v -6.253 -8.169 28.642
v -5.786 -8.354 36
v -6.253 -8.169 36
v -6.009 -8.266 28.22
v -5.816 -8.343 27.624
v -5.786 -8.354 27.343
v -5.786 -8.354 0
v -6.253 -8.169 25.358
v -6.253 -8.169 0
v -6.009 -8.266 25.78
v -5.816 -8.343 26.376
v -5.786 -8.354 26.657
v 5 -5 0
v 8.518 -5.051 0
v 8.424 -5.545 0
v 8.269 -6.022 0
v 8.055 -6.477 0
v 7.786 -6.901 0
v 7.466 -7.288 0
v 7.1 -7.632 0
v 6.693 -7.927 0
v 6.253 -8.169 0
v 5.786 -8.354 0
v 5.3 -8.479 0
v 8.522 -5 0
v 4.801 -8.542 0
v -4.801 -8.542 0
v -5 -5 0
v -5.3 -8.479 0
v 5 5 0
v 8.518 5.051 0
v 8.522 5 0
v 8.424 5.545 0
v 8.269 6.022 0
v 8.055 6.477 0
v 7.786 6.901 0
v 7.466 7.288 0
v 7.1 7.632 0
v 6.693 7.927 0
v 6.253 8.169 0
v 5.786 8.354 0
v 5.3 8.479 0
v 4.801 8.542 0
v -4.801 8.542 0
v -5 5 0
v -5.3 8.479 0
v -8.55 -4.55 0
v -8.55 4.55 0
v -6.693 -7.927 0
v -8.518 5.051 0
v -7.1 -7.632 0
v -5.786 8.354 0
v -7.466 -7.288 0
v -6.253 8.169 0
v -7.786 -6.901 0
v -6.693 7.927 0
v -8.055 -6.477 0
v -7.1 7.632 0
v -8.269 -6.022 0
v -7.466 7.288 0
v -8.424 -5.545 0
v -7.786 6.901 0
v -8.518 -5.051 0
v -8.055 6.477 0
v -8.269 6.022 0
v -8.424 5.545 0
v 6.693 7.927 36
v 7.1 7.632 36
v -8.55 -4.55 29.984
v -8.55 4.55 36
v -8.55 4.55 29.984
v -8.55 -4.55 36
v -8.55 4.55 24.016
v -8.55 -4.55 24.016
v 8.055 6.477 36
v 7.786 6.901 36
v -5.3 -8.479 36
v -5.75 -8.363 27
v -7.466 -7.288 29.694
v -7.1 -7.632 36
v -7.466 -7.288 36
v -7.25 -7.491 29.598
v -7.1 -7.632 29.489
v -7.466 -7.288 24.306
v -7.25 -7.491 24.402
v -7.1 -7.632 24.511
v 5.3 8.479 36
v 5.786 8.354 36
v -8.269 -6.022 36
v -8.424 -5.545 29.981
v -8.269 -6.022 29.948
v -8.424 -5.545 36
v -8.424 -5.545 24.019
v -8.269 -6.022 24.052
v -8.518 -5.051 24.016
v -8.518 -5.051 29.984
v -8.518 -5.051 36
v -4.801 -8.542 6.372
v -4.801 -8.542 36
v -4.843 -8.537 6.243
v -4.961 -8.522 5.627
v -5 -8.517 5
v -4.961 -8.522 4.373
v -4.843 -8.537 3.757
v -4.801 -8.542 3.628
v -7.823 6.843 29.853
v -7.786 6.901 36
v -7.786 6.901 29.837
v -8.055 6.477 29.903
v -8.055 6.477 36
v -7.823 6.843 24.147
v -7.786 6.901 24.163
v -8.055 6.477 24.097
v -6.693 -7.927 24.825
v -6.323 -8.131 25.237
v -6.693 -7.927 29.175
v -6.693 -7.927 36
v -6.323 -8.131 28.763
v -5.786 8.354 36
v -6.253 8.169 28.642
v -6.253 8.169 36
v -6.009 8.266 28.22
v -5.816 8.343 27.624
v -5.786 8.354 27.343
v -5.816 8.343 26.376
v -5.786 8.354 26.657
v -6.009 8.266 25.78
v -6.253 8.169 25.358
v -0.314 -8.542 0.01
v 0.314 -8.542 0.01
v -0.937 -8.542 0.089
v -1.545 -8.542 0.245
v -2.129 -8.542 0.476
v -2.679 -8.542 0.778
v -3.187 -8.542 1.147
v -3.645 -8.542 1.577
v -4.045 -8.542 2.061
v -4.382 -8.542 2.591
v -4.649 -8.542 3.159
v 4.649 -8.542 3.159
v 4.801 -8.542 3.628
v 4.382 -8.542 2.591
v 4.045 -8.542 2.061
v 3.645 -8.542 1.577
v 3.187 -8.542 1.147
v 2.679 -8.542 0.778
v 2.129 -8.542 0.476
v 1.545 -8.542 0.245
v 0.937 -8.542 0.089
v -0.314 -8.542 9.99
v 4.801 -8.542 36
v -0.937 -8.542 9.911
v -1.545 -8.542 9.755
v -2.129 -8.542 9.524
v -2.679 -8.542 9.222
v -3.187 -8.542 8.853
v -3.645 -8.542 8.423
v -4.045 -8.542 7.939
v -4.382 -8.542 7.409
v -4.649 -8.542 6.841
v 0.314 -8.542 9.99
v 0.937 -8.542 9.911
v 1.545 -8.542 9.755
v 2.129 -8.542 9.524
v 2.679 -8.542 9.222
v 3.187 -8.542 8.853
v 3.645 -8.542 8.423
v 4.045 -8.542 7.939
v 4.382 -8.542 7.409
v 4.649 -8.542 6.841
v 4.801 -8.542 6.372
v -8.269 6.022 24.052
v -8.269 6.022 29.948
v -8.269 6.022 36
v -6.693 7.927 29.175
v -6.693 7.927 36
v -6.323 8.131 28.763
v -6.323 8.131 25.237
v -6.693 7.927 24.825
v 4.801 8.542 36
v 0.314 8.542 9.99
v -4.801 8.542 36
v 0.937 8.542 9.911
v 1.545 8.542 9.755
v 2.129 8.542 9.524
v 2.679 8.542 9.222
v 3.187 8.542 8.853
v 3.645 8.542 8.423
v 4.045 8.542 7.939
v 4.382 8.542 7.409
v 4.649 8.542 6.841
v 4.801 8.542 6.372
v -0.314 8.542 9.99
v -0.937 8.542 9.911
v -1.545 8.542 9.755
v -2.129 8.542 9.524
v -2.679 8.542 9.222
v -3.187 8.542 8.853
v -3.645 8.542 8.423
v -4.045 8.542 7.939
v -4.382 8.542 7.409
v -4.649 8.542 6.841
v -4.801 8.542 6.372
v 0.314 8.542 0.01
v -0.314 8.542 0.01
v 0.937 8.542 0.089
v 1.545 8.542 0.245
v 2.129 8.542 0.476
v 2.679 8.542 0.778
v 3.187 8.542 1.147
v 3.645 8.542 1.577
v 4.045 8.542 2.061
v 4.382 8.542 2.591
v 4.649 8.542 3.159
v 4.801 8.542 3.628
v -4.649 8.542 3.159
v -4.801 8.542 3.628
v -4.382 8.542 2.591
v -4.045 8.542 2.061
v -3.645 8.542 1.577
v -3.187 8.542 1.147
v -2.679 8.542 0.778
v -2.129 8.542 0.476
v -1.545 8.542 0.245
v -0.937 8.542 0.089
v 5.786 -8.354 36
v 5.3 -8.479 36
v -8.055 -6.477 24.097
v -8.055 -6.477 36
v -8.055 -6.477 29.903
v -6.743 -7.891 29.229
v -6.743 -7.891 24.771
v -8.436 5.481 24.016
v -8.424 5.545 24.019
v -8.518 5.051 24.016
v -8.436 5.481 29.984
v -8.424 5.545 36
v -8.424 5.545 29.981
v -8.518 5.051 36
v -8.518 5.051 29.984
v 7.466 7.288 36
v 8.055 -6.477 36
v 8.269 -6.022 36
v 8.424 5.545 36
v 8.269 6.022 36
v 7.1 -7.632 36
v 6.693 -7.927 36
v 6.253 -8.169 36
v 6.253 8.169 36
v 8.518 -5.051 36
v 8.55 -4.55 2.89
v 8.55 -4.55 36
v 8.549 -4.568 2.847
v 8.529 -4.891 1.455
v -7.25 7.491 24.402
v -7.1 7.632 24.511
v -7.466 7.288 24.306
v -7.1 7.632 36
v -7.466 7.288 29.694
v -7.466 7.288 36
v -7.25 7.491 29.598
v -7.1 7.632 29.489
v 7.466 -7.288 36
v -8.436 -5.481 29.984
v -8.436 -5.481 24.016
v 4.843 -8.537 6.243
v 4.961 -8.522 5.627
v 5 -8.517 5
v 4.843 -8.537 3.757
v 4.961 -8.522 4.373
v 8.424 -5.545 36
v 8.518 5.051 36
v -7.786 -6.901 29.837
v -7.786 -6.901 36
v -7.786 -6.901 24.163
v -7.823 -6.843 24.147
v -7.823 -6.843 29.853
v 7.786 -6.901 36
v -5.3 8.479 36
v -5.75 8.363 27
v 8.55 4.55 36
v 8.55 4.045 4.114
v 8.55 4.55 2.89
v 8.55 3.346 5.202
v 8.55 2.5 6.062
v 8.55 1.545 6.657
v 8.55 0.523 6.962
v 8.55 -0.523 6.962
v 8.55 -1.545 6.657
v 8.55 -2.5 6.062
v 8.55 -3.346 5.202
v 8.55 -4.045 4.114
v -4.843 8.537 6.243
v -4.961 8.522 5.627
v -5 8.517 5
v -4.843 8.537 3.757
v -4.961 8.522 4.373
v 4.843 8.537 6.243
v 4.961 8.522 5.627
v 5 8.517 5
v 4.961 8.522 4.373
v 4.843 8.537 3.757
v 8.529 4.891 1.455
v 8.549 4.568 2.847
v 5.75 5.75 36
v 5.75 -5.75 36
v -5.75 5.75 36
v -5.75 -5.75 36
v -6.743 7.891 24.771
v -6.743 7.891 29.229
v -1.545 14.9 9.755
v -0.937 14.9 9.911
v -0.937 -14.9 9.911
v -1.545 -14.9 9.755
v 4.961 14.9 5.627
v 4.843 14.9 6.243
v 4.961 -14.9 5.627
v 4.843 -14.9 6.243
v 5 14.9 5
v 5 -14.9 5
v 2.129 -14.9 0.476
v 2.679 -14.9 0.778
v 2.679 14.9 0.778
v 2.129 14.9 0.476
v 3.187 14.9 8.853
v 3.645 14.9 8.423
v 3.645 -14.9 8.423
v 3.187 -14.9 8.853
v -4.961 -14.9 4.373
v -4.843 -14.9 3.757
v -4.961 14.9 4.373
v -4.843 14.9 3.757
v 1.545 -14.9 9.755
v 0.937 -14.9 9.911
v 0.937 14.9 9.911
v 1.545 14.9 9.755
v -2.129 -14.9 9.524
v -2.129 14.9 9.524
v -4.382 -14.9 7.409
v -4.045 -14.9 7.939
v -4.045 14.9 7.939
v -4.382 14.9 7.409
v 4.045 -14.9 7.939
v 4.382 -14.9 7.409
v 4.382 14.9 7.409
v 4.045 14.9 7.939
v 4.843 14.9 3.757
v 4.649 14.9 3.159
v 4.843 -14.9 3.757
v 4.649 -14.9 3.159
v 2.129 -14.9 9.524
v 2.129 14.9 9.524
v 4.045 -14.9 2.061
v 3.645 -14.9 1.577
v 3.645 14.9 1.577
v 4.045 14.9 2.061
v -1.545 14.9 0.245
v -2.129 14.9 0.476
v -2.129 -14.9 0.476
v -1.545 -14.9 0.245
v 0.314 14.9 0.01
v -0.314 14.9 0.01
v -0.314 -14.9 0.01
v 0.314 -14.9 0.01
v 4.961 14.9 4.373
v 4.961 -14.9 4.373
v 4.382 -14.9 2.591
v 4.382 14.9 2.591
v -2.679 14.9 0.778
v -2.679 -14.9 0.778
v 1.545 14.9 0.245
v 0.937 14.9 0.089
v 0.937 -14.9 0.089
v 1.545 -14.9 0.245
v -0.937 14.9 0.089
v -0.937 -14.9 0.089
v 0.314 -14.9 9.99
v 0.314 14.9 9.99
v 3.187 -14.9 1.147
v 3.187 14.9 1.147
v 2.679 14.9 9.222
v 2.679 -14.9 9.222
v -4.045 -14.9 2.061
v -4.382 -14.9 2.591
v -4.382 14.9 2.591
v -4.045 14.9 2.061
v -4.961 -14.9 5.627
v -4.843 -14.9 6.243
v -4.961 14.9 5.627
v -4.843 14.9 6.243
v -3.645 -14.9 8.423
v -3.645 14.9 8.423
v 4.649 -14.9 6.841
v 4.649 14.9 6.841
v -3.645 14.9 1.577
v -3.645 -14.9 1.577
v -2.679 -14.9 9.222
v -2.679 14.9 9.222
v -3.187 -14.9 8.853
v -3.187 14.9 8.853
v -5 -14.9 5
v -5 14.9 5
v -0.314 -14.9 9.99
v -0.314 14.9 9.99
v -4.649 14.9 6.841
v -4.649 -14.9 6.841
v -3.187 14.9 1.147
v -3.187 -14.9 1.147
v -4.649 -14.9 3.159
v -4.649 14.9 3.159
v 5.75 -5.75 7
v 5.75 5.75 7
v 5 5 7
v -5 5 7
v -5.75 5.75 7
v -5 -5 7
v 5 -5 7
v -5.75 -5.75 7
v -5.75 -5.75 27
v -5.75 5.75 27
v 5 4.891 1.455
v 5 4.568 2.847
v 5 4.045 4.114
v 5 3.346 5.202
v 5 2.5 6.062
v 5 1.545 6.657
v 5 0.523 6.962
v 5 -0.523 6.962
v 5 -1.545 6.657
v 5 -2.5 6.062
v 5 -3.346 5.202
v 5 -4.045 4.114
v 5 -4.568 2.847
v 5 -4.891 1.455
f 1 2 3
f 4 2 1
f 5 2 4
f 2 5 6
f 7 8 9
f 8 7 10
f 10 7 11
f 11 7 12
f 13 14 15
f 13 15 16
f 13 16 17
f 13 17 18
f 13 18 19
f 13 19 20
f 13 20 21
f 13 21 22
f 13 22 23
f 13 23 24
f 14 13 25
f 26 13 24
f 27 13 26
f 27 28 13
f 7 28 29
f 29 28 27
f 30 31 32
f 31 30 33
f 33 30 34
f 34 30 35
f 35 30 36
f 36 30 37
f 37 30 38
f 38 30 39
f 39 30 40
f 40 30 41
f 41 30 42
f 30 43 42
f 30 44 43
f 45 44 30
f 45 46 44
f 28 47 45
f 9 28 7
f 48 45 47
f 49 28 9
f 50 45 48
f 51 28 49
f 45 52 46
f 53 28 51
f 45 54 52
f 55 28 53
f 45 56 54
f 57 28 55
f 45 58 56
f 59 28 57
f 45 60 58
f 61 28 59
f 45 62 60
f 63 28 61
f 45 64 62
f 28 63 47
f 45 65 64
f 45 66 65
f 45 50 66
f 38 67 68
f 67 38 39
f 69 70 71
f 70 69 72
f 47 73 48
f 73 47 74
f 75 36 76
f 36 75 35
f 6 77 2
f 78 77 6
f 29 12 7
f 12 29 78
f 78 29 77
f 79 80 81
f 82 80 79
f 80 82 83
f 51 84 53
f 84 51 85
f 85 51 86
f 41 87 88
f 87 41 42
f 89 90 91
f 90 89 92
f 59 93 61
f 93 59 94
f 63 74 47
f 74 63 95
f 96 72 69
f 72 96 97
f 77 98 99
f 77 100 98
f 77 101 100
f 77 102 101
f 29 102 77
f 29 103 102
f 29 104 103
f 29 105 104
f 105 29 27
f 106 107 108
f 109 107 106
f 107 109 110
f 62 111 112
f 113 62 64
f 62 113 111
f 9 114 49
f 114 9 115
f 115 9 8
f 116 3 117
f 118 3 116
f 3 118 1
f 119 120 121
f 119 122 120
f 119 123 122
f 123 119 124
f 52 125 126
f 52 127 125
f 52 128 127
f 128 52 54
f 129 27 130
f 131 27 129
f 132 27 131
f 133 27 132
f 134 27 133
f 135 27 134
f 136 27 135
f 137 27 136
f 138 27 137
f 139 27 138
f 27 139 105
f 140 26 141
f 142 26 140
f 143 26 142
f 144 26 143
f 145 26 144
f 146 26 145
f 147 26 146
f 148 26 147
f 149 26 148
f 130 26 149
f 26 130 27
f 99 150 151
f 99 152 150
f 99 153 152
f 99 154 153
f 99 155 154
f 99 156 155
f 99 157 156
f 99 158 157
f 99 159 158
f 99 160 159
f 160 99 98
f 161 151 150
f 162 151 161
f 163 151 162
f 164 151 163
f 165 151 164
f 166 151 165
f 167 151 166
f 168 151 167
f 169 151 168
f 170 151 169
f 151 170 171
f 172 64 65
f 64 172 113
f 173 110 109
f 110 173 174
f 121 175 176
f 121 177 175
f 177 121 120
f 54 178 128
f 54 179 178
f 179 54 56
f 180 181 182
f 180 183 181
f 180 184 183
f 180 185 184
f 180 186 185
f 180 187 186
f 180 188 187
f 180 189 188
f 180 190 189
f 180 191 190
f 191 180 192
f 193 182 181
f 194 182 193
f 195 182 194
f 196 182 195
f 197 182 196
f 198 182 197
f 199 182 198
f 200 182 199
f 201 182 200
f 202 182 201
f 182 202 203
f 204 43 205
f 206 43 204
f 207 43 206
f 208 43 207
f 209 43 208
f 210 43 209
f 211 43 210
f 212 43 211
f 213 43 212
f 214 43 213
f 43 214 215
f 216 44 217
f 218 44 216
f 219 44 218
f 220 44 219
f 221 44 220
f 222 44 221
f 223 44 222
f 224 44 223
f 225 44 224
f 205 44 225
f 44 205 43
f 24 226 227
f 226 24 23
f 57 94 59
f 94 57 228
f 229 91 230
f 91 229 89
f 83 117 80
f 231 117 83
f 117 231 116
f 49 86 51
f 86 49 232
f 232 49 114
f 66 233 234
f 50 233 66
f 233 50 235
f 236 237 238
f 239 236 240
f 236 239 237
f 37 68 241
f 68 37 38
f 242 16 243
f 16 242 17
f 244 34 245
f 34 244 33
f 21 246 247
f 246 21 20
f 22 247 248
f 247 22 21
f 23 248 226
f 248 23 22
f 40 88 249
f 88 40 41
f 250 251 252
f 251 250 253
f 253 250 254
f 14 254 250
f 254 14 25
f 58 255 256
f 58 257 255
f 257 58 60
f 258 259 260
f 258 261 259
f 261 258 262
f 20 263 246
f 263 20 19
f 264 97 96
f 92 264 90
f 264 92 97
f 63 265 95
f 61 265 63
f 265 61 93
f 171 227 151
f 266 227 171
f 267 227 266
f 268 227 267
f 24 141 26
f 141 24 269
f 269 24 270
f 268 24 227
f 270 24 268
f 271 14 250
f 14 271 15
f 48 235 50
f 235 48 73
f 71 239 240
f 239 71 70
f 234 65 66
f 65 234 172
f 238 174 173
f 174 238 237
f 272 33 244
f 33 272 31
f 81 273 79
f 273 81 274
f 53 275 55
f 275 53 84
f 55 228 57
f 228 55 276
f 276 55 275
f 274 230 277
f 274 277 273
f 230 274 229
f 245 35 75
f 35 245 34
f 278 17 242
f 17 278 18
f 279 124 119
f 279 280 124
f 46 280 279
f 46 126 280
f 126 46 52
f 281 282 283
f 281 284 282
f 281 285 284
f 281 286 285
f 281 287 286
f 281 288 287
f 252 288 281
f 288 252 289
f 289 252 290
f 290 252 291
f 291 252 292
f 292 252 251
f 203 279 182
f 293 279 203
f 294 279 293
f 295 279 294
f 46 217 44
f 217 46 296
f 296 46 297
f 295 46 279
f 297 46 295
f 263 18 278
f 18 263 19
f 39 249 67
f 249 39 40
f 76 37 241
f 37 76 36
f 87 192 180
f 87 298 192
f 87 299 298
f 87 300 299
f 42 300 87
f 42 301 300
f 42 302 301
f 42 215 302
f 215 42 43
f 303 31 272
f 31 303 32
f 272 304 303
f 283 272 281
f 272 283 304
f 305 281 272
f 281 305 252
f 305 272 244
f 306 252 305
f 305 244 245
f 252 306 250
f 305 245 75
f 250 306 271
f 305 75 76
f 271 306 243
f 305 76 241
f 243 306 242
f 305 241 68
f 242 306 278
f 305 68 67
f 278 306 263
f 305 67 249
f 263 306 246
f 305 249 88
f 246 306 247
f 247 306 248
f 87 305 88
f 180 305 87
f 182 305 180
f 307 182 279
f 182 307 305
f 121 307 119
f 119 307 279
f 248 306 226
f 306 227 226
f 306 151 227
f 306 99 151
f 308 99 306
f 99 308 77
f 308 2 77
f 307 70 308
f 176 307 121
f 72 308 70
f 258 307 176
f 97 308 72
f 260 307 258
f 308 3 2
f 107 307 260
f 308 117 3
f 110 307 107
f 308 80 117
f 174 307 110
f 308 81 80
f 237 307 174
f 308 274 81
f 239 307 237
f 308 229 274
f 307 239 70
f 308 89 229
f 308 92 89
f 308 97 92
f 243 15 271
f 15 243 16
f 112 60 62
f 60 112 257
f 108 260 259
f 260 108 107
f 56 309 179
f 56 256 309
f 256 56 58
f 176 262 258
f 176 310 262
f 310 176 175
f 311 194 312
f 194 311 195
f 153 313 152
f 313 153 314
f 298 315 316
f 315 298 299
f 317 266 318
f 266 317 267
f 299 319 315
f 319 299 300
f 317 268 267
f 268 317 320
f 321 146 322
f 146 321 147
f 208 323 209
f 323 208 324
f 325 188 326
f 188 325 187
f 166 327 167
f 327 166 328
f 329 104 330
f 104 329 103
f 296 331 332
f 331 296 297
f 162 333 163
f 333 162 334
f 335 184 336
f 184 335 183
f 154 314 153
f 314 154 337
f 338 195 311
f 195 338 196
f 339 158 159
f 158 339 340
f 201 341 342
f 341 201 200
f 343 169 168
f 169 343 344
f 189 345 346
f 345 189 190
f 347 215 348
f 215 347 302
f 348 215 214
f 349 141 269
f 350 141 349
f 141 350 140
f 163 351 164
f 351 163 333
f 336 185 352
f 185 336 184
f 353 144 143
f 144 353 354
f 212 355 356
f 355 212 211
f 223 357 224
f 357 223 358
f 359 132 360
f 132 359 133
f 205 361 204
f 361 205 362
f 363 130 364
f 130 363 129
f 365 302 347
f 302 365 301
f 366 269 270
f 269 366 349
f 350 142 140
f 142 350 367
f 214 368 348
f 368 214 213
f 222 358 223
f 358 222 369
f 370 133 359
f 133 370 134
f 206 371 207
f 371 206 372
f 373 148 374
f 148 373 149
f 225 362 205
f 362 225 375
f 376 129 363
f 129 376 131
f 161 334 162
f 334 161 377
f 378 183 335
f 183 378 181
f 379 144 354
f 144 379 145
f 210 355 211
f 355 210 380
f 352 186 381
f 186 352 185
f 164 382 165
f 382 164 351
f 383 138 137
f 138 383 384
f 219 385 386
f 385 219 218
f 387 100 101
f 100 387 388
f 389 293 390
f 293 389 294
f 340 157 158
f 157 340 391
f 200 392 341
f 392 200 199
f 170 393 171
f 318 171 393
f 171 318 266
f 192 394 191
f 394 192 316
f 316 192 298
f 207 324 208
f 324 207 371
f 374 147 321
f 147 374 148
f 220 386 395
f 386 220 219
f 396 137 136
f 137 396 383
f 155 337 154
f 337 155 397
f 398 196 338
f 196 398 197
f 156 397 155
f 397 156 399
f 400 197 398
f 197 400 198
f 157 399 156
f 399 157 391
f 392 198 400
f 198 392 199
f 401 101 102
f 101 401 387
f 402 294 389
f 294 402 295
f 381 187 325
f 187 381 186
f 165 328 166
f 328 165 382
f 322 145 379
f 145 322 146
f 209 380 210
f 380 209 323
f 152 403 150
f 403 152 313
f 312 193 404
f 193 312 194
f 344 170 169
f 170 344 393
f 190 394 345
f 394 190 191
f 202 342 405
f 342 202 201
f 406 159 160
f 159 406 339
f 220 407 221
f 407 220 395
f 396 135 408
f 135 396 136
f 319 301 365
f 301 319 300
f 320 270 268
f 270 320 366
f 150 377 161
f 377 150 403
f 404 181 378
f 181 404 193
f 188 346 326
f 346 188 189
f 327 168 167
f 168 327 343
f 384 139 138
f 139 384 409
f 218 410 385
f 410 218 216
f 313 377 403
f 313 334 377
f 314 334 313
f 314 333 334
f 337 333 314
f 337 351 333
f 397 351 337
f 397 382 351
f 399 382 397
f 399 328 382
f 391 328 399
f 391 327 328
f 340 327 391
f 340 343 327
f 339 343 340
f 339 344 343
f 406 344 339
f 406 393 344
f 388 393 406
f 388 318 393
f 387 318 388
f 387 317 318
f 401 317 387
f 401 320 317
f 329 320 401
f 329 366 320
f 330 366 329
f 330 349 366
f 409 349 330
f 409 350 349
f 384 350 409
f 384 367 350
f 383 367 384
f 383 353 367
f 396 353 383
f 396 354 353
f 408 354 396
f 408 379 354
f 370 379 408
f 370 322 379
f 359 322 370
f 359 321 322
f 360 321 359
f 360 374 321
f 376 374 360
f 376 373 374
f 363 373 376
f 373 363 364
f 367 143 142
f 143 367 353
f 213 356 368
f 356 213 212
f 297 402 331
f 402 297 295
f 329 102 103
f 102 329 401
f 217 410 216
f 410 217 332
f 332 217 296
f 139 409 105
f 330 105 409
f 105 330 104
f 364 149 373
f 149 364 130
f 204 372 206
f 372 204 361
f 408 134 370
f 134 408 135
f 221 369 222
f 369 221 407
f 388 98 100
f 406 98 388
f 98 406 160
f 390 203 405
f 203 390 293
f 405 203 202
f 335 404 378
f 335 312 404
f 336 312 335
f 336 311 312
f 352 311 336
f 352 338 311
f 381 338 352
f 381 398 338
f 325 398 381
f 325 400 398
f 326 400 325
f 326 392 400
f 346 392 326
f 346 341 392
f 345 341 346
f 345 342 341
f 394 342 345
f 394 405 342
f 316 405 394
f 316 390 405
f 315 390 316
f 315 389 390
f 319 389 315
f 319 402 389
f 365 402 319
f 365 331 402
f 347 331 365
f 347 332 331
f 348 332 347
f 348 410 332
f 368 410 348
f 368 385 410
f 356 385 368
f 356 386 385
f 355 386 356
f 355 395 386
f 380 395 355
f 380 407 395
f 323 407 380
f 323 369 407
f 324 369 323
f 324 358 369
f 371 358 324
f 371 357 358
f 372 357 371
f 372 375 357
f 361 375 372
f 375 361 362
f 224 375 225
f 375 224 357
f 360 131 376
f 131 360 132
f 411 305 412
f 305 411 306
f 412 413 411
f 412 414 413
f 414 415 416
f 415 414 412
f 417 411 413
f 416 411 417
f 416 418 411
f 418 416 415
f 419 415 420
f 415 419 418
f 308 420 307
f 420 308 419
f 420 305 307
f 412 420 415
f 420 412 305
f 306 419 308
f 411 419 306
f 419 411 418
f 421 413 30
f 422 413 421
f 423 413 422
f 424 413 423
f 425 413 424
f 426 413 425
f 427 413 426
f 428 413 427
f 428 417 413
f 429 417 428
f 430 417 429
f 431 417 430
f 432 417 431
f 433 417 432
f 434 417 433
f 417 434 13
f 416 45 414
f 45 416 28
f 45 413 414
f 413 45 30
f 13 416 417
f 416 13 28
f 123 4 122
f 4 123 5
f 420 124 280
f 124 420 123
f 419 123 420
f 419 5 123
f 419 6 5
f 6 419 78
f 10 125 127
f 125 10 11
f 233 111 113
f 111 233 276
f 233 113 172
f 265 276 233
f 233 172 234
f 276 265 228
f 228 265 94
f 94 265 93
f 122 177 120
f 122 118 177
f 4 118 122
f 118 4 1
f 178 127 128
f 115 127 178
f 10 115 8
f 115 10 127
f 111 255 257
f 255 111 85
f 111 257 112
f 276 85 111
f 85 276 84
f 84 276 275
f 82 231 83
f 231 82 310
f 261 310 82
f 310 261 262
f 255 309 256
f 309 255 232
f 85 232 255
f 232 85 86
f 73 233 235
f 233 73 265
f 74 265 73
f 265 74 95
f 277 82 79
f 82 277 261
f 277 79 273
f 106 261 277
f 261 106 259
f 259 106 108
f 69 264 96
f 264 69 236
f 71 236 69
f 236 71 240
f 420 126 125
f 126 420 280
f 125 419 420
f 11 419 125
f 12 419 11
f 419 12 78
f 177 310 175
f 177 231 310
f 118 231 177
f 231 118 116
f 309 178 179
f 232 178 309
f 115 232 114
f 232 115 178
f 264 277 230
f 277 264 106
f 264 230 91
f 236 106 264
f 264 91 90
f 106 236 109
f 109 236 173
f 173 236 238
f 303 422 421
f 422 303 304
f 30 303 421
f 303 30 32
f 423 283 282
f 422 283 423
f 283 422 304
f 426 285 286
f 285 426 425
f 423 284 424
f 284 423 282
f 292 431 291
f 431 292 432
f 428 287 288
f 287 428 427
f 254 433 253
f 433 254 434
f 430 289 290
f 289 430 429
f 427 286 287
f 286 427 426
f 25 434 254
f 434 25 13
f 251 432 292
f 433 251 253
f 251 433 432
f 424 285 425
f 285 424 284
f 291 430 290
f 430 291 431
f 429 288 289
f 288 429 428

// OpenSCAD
// file: tube.scad
$fn = 50;


module tube(height, width, fillet, hole){
	if(hole>0){
		difference(){
			translate([fillet-width/2,fillet-width/2,0]){
				minkowski(){
					cube([width-fillet*2,width-fillet*2,height]);
					cylinder(r=fillet,h=1);
				}
			}
			translate([width/2,width/2,-.5])
			cylinder(h=height+2,r=hole); 
		}
	} else {
	translate([fillet-width/2,fillet-width/2,0]){
		minkowski(){
			cube([width-fillet*2,width-fillet*2,height]);
			cylinder(r=fillet,h=1);
		}
	}
}
}



tube(20,20,3,0);
// main file
use <tube.scad>

module arm(){
	in = 25.4;

	length = 35;

	tubeInWidth = 11.5;
	tubeWall = 2.8;
	boltR = 3;
	boltHeight = 27;
	
	tubeOutWidth = tubeInWidth+2*tubeWall;

	pegDiameter = 10;
	height = (tubeOutWidth+1/2*in);

	difference(){
		union(){
			translate([0,0,0]) tube(length,tubeOutWidth,4,0);
			translate([0,height/2,pegDiameter/2]) rotate([90,0,0]) cylinder(r=pegDiameter/2, h=height, $fn = 50);
		}
		translate([0,0,length/2+8]) cube([tubeInWidth,tubeInWidth,length+2], center=true);
		translate([0,0,3]) cube([tubeInWidth-1.5,tubeInWidth-1.5,10], center=true);
		translate([-tubeInWidth/2-boltR,tubeInWidth-tubeWall/2,boltHeight]) rotate([90,0,0]) cylinder(r=boltR, h=tubeInWidth+tubeWall*3, $fn=30);
		translate([0,0,0]) rotate([90,0,90]) scale([1,1.4,1]) cylinder(h=tubeInWidth, r=5, $fn=30);
	}
}

arm();
